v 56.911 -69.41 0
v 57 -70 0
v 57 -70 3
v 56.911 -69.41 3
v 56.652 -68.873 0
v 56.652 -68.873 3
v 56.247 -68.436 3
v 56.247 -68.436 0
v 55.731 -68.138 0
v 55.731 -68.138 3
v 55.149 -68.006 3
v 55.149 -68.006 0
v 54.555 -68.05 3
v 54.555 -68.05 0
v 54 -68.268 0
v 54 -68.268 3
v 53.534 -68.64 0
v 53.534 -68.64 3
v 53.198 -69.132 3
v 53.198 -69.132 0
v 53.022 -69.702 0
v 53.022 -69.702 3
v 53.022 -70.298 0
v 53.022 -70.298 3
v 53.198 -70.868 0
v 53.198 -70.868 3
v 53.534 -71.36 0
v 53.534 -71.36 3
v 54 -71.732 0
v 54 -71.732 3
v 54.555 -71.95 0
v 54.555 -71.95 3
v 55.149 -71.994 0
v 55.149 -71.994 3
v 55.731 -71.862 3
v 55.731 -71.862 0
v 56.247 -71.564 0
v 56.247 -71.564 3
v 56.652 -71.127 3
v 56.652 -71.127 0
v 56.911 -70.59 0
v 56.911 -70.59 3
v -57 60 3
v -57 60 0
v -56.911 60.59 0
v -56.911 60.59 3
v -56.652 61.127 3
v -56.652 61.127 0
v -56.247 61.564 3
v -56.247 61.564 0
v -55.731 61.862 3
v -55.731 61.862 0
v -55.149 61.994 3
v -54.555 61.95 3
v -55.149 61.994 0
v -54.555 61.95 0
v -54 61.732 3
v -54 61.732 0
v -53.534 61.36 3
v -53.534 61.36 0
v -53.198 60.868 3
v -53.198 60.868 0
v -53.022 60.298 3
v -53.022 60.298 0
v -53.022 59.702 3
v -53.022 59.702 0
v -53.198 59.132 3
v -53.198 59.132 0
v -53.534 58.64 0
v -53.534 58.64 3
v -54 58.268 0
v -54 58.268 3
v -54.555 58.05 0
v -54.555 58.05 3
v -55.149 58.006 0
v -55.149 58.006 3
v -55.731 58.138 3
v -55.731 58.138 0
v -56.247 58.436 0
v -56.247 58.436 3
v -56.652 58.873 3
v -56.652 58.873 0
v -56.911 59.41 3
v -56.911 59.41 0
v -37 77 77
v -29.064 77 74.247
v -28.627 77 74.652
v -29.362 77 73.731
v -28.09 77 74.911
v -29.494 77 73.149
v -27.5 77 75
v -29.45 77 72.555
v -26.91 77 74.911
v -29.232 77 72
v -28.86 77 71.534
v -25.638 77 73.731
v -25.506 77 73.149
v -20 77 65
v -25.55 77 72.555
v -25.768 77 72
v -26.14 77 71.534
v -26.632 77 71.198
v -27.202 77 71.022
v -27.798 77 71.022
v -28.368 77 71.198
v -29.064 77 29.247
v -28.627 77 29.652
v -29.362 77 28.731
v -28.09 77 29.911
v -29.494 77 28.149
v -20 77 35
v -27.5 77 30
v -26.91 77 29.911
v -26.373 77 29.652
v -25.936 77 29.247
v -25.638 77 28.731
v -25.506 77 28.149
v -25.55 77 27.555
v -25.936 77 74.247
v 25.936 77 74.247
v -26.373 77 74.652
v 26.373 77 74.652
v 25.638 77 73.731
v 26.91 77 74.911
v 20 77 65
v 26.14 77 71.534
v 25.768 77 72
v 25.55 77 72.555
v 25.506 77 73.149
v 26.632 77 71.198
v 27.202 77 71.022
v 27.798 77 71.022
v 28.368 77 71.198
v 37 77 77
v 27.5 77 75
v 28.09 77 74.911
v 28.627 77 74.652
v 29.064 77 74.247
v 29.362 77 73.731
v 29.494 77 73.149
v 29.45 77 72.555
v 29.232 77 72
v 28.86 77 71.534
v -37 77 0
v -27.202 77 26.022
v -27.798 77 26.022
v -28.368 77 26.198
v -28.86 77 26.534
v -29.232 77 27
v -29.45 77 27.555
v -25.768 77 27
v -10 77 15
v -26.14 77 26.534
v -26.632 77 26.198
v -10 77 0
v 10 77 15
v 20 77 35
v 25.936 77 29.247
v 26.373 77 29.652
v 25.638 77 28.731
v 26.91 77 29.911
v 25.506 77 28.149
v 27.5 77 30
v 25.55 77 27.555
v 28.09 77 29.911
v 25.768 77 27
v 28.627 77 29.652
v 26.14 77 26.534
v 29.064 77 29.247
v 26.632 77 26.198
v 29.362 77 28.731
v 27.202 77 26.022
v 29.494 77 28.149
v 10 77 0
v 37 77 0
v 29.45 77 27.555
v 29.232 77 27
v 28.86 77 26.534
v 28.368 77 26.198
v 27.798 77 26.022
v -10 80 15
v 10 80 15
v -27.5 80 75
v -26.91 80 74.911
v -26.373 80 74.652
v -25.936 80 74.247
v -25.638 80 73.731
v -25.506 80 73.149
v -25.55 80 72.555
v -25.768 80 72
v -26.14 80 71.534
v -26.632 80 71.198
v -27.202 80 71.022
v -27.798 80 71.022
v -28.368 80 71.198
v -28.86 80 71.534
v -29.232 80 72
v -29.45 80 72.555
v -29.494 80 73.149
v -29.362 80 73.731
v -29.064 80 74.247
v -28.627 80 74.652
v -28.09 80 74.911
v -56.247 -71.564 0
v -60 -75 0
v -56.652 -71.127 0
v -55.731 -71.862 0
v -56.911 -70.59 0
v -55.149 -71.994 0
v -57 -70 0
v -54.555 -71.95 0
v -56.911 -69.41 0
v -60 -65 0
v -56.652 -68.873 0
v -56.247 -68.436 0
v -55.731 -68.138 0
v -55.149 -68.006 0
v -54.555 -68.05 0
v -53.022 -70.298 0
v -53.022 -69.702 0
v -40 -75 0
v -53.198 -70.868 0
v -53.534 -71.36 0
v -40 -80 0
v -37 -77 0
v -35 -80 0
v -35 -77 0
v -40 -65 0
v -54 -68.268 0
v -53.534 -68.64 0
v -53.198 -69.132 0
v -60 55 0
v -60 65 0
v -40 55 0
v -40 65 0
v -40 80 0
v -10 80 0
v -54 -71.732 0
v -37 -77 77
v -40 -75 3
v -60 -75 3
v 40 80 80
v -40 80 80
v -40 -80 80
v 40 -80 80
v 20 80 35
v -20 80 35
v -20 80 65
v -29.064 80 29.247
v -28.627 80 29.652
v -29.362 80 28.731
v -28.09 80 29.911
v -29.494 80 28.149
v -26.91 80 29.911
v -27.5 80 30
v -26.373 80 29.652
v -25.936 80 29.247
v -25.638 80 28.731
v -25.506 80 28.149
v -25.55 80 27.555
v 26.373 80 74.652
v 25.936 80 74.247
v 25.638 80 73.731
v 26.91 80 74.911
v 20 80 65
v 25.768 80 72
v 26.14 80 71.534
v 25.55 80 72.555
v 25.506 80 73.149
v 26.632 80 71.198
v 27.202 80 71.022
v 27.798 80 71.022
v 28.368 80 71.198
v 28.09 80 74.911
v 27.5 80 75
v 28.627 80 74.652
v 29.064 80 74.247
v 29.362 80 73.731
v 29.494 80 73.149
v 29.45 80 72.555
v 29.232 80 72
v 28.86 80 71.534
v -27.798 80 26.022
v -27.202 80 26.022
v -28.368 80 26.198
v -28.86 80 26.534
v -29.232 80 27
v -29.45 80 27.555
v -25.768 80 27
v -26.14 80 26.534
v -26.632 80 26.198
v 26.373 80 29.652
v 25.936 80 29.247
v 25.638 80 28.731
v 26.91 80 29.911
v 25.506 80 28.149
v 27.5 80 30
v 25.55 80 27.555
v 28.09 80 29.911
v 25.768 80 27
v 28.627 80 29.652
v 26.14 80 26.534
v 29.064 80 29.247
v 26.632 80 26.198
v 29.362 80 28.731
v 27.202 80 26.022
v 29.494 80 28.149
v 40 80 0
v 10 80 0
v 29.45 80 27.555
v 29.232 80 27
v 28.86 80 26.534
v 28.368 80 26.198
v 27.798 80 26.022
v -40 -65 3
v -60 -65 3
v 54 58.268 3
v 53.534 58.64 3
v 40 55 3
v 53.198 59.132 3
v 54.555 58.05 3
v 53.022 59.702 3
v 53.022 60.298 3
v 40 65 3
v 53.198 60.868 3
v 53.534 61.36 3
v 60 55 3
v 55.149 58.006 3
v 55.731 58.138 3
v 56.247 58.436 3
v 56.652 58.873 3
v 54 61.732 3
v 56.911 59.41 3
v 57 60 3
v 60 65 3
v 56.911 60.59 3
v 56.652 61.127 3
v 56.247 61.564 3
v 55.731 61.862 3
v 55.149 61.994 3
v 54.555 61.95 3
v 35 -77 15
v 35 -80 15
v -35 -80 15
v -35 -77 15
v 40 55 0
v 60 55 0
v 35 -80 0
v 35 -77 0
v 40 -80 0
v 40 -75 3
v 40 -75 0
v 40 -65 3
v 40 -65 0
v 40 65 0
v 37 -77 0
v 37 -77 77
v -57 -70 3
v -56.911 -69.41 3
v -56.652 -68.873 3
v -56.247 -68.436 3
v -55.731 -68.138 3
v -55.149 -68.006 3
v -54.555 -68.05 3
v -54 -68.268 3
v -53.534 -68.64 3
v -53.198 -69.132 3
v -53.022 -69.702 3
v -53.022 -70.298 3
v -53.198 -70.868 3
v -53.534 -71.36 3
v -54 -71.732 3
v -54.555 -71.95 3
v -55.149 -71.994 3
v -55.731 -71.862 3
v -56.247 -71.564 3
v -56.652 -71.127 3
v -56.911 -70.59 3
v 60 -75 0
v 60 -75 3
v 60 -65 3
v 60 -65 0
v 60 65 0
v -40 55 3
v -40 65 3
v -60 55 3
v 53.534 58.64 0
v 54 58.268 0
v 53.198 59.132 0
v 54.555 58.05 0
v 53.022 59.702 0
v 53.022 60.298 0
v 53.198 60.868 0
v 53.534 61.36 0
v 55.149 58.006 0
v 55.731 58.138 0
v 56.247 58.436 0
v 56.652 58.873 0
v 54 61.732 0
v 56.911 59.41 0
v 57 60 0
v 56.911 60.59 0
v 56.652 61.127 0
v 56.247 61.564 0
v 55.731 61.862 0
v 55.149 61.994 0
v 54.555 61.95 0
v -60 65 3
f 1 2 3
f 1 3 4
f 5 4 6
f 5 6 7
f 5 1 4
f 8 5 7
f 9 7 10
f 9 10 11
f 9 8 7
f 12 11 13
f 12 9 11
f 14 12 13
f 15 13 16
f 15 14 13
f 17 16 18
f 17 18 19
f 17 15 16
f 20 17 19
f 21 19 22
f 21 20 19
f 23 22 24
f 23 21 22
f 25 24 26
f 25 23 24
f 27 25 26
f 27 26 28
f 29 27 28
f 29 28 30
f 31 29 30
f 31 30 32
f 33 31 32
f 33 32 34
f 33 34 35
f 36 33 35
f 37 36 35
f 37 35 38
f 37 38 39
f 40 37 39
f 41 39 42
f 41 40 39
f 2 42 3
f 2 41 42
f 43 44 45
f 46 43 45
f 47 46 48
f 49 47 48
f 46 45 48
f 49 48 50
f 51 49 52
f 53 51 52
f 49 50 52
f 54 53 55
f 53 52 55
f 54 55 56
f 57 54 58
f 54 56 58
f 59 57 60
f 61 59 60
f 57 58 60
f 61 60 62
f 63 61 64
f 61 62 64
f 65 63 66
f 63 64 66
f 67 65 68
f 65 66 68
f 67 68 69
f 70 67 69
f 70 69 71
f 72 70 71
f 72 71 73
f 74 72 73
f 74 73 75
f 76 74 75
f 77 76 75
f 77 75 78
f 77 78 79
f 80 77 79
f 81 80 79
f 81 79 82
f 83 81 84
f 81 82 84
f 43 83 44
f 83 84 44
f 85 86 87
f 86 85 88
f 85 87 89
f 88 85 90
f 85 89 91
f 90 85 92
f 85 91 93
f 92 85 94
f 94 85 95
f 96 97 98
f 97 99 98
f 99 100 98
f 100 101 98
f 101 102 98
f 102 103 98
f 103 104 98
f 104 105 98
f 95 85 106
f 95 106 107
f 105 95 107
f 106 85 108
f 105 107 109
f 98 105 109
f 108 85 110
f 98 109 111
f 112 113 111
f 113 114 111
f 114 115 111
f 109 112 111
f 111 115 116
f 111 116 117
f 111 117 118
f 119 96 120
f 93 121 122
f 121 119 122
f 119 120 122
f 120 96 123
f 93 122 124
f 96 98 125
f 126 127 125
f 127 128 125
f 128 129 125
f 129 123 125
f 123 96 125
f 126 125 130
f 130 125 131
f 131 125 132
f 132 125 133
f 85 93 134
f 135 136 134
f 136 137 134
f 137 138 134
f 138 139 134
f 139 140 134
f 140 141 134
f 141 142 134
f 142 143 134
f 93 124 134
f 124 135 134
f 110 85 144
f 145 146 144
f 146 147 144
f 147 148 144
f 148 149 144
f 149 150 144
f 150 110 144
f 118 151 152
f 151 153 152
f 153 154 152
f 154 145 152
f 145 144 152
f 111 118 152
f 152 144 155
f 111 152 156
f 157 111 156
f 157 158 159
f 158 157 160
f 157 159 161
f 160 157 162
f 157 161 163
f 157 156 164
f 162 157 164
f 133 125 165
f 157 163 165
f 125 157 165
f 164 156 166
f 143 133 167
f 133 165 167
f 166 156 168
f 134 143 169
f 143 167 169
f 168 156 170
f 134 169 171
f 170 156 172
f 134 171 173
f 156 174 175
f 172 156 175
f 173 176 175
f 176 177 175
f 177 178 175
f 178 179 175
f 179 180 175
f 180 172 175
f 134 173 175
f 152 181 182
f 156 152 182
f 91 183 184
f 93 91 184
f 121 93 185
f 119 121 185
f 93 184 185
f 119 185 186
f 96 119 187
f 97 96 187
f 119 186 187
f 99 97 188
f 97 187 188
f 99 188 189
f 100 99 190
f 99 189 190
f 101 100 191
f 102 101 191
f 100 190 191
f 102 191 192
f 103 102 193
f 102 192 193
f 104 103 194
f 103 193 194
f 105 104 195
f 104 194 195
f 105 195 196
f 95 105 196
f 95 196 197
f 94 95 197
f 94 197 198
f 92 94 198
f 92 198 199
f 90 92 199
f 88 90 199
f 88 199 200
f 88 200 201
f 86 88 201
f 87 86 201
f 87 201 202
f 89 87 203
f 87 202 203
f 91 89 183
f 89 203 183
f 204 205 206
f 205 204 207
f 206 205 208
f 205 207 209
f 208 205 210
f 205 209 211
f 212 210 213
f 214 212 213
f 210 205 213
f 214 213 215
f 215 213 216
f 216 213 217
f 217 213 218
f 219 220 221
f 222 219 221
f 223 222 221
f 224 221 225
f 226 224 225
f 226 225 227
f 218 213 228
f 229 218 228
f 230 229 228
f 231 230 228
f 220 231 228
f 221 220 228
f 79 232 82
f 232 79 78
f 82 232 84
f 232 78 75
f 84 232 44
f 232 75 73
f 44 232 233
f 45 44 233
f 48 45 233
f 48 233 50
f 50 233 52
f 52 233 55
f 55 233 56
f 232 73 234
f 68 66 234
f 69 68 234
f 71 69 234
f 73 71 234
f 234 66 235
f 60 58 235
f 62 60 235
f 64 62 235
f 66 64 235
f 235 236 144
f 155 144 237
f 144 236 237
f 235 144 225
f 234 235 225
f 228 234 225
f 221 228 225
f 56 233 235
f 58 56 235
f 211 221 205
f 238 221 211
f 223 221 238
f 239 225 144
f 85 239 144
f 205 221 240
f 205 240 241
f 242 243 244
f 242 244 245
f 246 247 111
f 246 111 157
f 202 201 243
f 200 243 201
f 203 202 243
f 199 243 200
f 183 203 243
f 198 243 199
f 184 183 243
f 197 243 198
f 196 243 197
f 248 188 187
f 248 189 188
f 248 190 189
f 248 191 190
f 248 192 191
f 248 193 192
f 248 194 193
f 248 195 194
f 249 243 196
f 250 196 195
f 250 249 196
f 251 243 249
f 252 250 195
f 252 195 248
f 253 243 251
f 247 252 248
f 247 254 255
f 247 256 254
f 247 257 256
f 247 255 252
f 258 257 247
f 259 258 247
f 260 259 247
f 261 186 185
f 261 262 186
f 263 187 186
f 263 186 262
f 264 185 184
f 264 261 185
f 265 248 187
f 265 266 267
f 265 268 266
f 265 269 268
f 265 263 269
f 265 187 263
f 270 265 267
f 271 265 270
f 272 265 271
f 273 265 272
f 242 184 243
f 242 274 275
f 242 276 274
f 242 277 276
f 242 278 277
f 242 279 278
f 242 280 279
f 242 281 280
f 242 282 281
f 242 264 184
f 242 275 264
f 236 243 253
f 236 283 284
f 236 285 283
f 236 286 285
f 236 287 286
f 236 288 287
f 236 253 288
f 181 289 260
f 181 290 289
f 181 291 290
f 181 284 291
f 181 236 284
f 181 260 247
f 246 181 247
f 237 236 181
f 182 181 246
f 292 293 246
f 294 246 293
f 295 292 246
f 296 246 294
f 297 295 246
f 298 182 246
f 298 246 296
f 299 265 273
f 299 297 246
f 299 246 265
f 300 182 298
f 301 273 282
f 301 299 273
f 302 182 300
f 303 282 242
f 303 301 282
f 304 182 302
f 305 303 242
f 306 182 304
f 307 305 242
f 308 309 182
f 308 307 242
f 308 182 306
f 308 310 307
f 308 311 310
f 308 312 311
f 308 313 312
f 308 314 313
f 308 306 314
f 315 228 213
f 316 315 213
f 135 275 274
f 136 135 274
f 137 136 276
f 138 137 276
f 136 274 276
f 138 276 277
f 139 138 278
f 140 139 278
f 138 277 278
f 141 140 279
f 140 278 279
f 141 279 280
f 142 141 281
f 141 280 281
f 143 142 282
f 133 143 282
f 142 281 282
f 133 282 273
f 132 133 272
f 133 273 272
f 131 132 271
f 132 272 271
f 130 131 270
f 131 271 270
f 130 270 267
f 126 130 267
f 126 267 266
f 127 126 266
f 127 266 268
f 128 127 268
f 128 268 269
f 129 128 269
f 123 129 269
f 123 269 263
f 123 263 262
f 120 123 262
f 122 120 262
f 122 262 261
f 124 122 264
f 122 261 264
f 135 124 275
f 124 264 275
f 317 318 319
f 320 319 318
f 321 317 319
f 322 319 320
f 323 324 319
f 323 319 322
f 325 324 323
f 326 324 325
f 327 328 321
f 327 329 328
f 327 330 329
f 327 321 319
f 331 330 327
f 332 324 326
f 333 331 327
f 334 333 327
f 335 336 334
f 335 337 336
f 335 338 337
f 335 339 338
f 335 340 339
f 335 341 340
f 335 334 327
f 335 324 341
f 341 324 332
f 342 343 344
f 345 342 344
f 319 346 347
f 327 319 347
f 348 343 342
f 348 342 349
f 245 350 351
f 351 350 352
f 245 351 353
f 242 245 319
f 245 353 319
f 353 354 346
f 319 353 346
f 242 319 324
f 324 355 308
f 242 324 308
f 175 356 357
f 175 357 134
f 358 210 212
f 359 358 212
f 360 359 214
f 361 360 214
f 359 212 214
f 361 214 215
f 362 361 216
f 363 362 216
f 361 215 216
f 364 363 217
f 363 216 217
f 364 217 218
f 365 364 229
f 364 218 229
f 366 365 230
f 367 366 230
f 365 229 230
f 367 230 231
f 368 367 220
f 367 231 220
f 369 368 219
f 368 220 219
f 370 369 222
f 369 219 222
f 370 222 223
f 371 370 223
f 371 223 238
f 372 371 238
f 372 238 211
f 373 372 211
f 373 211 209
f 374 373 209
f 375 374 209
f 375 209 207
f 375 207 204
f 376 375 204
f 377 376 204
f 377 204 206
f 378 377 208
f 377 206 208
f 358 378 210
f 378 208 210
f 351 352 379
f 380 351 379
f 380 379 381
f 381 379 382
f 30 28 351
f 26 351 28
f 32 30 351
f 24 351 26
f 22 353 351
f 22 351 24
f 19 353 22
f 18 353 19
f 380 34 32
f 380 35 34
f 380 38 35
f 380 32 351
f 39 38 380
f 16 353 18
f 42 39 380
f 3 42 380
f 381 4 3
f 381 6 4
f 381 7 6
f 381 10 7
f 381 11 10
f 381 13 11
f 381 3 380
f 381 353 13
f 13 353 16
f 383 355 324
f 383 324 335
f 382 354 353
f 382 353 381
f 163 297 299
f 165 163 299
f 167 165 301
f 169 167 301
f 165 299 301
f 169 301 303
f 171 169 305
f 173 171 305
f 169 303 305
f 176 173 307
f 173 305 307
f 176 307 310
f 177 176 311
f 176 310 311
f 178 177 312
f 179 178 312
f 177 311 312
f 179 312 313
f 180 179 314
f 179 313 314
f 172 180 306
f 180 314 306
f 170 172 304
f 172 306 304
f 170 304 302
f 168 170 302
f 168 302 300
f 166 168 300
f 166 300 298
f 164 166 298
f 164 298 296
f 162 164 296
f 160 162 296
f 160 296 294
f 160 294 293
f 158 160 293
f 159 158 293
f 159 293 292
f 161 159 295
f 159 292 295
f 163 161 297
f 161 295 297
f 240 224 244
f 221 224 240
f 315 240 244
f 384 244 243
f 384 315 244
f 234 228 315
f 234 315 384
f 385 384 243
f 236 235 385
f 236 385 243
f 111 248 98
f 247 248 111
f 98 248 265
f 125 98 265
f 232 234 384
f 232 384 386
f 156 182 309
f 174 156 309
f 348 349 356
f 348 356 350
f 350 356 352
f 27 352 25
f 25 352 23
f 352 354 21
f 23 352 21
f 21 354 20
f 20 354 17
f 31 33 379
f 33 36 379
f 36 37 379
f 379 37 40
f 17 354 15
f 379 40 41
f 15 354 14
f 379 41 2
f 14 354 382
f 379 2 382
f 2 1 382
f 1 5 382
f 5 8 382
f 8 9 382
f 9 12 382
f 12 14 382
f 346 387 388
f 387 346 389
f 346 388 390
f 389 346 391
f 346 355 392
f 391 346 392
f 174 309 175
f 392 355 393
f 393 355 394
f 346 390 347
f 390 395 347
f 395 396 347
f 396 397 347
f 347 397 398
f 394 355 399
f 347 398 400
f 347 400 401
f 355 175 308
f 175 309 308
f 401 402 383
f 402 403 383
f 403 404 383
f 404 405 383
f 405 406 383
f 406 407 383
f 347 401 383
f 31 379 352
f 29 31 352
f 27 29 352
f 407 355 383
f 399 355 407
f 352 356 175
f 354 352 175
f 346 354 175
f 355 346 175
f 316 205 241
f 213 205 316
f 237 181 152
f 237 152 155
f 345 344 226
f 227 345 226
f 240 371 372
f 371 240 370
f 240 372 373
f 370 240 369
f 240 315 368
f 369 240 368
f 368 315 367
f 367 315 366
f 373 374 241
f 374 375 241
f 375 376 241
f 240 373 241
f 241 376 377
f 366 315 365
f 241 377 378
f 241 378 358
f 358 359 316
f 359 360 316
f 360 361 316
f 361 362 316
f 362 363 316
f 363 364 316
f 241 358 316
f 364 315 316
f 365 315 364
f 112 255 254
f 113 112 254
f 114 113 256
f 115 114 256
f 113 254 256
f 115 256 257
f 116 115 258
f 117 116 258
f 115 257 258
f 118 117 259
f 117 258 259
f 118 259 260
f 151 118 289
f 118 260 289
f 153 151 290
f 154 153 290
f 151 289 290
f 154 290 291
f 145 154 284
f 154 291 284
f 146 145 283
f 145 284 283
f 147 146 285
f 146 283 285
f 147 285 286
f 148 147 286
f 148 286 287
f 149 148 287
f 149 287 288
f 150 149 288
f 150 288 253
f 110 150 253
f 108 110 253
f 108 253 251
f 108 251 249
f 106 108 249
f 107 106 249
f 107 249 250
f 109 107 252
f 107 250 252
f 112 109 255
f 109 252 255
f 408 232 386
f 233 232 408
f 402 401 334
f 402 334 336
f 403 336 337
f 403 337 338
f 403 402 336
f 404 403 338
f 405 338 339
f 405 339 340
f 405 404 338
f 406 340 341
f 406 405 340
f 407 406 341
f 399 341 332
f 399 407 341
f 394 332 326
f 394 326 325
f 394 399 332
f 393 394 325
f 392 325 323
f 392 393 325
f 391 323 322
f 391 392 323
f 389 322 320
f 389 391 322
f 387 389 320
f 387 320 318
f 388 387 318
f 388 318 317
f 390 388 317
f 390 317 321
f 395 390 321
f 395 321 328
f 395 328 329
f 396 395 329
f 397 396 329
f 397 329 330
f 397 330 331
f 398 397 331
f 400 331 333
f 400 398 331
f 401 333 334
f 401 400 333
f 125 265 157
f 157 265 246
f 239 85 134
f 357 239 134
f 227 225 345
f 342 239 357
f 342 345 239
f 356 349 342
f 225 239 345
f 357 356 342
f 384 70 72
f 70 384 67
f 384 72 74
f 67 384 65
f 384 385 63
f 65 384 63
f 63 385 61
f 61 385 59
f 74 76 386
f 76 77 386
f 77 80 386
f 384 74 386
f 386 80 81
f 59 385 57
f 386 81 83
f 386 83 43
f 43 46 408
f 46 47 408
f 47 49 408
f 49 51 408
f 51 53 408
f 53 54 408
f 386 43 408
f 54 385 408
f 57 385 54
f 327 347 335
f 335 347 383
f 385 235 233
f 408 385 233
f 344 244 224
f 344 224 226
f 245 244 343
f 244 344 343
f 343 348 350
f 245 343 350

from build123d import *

# Parameters (mm, degrees)
SKETCH1_W           = 80
SKETCH1_H           = 160
BOSS_EXTRUDE1_DEPTH = 80
SHELL1_T            = -3
SKETCH2_W           = 40
SKETCH2_H           = 30
CUT_EXTRUDE1_DEPTH  = 70
SKETCH3_W           = 20
SKETCH3_H           = 15
CUT_EXTRUDE2_DEPTH  = 70
SKETCH4_W           = 70
SKETCH4_H           = 15
CUT_EXTRUDE3_DEPTH  = 70
SKETCH5_W           = 20
SKETCH5_H           = 10
SKETCH5_R           = 2
BOSS_EXTRUDE2_DEPTH = 3
SKETCH6_R           = 2
CUT_EXTRUDE4_DEPTH  = 3


with BuildPart() as part:
    # Sketch1 → Boss-Extrude1 (new body)
    with BuildSketch(Plane.XY):
        Rectangle(SKETCH1_W, SKETCH1_H)
    extrude(amount=BOSS_EXTRUDE1_DEPTH)

    # Shell1
    shell1_openings = [part.faces().sort_by_distance(p)[0] for p in [
        (0, 0, 0),
    ]]
    offset(amount=SHELL1_T, openings=shell1_openings, kind=Kind.INTERSECTION)

    # Sketch2 → Cut-Extrude1 (cut)
    with BuildSketch(Plane(origin=(0, 80, 0), x_dir=(1, 0, 0), z_dir=(0, 1, 0))):
        with Locations((0, -50)):
            Rectangle(SKETCH2_W, SKETCH2_H)
    extrude(amount=-CUT_EXTRUDE1_DEPTH, mode=Mode.SUBTRACT)

    # Sketch3 → Cut-Extrude2 (cut)
    with BuildSketch(Plane(origin=(0, 80, 0), x_dir=(1, 0, 0), z_dir=(0, 1, 0))):
        with Locations((0, -7.5)):
            Rectangle(SKETCH3_W, SKETCH3_H)
    extrude(amount=-CUT_EXTRUDE2_DEPTH, mode=Mode.SUBTRACT)

    # Sketch4 → Cut-Extrude3 (cut)
    with BuildSketch(Plane(origin=(0, -80, 0), x_dir=(-1, 0, 0), z_dir=(0, -1, 0))):
        with Locations((0, -7.5)):
            Rectangle(SKETCH4_W, SKETCH4_H)
    extrude(amount=-CUT_EXTRUDE3_DEPTH, mode=Mode.SUBTRACT)

    # Sketch5 → Boss-Extrude2 (add)
    # profile 1 of 2: a face of its own
    with BuildSketch(Plane(origin=(0, 0, 0), x_dir=(-1, 0, 0), z_dir=(0, 0, -1))):
        with Locations((50, 60)):
            Rectangle(SKETCH5_W, SKETCH5_H)
        with Locations((55, 60)):
            Circle(SKETCH5_R, mode=Mode.SUBTRACT)
    # profile 2 of 2: a face of its own
    with BuildSketch(Plane(origin=(0, 0, 0), x_dir=(-1, 0, 0), z_dir=(0, 0, -1))):
        with Locations((50, -70)):
            Rectangle(SKETCH5_W, SKETCH5_H)
        with Locations((55, -70)):
            Circle(SKETCH5_R, mode=Mode.SUBTRACT)
    boss_extrude2 = extrude(amount=-BOSS_EXTRUDE2_DEPTH)

    # Mirror1: Boss-Extrude2 across plane
    add(boss_extrude2.mirror(Plane(origin=(0, 0, 0), x_dir=(0, 0, 1), z_dir=(1, 0, 0))))

    # Sketch6 → Cut-Extrude4 (cut)
    with BuildSketch(Plane(origin=(0, 80, 0), x_dir=(1, 0, 0), z_dir=(0, 1, 0))):
        with Locations(Location((-27.5, -28, 0), (0, 0, 270))):
            Circle(SKETCH6_R)
        with Locations(Location((27.5, -28, 0), (0, 0, 270))):
            Circle(SKETCH6_R)
        with Locations(Location((27.5, -73, 0), (0, 0, 270))):
            Circle(SKETCH6_R)
        with Locations(Location((-27.5, -73, 0), (0, 0, 270))):
            Circle(SKETCH6_R)
    extrude(amount=-CUT_EXTRUDE4_DEPTH, mode=Mode.SUBTRACT)


solid = part.part
